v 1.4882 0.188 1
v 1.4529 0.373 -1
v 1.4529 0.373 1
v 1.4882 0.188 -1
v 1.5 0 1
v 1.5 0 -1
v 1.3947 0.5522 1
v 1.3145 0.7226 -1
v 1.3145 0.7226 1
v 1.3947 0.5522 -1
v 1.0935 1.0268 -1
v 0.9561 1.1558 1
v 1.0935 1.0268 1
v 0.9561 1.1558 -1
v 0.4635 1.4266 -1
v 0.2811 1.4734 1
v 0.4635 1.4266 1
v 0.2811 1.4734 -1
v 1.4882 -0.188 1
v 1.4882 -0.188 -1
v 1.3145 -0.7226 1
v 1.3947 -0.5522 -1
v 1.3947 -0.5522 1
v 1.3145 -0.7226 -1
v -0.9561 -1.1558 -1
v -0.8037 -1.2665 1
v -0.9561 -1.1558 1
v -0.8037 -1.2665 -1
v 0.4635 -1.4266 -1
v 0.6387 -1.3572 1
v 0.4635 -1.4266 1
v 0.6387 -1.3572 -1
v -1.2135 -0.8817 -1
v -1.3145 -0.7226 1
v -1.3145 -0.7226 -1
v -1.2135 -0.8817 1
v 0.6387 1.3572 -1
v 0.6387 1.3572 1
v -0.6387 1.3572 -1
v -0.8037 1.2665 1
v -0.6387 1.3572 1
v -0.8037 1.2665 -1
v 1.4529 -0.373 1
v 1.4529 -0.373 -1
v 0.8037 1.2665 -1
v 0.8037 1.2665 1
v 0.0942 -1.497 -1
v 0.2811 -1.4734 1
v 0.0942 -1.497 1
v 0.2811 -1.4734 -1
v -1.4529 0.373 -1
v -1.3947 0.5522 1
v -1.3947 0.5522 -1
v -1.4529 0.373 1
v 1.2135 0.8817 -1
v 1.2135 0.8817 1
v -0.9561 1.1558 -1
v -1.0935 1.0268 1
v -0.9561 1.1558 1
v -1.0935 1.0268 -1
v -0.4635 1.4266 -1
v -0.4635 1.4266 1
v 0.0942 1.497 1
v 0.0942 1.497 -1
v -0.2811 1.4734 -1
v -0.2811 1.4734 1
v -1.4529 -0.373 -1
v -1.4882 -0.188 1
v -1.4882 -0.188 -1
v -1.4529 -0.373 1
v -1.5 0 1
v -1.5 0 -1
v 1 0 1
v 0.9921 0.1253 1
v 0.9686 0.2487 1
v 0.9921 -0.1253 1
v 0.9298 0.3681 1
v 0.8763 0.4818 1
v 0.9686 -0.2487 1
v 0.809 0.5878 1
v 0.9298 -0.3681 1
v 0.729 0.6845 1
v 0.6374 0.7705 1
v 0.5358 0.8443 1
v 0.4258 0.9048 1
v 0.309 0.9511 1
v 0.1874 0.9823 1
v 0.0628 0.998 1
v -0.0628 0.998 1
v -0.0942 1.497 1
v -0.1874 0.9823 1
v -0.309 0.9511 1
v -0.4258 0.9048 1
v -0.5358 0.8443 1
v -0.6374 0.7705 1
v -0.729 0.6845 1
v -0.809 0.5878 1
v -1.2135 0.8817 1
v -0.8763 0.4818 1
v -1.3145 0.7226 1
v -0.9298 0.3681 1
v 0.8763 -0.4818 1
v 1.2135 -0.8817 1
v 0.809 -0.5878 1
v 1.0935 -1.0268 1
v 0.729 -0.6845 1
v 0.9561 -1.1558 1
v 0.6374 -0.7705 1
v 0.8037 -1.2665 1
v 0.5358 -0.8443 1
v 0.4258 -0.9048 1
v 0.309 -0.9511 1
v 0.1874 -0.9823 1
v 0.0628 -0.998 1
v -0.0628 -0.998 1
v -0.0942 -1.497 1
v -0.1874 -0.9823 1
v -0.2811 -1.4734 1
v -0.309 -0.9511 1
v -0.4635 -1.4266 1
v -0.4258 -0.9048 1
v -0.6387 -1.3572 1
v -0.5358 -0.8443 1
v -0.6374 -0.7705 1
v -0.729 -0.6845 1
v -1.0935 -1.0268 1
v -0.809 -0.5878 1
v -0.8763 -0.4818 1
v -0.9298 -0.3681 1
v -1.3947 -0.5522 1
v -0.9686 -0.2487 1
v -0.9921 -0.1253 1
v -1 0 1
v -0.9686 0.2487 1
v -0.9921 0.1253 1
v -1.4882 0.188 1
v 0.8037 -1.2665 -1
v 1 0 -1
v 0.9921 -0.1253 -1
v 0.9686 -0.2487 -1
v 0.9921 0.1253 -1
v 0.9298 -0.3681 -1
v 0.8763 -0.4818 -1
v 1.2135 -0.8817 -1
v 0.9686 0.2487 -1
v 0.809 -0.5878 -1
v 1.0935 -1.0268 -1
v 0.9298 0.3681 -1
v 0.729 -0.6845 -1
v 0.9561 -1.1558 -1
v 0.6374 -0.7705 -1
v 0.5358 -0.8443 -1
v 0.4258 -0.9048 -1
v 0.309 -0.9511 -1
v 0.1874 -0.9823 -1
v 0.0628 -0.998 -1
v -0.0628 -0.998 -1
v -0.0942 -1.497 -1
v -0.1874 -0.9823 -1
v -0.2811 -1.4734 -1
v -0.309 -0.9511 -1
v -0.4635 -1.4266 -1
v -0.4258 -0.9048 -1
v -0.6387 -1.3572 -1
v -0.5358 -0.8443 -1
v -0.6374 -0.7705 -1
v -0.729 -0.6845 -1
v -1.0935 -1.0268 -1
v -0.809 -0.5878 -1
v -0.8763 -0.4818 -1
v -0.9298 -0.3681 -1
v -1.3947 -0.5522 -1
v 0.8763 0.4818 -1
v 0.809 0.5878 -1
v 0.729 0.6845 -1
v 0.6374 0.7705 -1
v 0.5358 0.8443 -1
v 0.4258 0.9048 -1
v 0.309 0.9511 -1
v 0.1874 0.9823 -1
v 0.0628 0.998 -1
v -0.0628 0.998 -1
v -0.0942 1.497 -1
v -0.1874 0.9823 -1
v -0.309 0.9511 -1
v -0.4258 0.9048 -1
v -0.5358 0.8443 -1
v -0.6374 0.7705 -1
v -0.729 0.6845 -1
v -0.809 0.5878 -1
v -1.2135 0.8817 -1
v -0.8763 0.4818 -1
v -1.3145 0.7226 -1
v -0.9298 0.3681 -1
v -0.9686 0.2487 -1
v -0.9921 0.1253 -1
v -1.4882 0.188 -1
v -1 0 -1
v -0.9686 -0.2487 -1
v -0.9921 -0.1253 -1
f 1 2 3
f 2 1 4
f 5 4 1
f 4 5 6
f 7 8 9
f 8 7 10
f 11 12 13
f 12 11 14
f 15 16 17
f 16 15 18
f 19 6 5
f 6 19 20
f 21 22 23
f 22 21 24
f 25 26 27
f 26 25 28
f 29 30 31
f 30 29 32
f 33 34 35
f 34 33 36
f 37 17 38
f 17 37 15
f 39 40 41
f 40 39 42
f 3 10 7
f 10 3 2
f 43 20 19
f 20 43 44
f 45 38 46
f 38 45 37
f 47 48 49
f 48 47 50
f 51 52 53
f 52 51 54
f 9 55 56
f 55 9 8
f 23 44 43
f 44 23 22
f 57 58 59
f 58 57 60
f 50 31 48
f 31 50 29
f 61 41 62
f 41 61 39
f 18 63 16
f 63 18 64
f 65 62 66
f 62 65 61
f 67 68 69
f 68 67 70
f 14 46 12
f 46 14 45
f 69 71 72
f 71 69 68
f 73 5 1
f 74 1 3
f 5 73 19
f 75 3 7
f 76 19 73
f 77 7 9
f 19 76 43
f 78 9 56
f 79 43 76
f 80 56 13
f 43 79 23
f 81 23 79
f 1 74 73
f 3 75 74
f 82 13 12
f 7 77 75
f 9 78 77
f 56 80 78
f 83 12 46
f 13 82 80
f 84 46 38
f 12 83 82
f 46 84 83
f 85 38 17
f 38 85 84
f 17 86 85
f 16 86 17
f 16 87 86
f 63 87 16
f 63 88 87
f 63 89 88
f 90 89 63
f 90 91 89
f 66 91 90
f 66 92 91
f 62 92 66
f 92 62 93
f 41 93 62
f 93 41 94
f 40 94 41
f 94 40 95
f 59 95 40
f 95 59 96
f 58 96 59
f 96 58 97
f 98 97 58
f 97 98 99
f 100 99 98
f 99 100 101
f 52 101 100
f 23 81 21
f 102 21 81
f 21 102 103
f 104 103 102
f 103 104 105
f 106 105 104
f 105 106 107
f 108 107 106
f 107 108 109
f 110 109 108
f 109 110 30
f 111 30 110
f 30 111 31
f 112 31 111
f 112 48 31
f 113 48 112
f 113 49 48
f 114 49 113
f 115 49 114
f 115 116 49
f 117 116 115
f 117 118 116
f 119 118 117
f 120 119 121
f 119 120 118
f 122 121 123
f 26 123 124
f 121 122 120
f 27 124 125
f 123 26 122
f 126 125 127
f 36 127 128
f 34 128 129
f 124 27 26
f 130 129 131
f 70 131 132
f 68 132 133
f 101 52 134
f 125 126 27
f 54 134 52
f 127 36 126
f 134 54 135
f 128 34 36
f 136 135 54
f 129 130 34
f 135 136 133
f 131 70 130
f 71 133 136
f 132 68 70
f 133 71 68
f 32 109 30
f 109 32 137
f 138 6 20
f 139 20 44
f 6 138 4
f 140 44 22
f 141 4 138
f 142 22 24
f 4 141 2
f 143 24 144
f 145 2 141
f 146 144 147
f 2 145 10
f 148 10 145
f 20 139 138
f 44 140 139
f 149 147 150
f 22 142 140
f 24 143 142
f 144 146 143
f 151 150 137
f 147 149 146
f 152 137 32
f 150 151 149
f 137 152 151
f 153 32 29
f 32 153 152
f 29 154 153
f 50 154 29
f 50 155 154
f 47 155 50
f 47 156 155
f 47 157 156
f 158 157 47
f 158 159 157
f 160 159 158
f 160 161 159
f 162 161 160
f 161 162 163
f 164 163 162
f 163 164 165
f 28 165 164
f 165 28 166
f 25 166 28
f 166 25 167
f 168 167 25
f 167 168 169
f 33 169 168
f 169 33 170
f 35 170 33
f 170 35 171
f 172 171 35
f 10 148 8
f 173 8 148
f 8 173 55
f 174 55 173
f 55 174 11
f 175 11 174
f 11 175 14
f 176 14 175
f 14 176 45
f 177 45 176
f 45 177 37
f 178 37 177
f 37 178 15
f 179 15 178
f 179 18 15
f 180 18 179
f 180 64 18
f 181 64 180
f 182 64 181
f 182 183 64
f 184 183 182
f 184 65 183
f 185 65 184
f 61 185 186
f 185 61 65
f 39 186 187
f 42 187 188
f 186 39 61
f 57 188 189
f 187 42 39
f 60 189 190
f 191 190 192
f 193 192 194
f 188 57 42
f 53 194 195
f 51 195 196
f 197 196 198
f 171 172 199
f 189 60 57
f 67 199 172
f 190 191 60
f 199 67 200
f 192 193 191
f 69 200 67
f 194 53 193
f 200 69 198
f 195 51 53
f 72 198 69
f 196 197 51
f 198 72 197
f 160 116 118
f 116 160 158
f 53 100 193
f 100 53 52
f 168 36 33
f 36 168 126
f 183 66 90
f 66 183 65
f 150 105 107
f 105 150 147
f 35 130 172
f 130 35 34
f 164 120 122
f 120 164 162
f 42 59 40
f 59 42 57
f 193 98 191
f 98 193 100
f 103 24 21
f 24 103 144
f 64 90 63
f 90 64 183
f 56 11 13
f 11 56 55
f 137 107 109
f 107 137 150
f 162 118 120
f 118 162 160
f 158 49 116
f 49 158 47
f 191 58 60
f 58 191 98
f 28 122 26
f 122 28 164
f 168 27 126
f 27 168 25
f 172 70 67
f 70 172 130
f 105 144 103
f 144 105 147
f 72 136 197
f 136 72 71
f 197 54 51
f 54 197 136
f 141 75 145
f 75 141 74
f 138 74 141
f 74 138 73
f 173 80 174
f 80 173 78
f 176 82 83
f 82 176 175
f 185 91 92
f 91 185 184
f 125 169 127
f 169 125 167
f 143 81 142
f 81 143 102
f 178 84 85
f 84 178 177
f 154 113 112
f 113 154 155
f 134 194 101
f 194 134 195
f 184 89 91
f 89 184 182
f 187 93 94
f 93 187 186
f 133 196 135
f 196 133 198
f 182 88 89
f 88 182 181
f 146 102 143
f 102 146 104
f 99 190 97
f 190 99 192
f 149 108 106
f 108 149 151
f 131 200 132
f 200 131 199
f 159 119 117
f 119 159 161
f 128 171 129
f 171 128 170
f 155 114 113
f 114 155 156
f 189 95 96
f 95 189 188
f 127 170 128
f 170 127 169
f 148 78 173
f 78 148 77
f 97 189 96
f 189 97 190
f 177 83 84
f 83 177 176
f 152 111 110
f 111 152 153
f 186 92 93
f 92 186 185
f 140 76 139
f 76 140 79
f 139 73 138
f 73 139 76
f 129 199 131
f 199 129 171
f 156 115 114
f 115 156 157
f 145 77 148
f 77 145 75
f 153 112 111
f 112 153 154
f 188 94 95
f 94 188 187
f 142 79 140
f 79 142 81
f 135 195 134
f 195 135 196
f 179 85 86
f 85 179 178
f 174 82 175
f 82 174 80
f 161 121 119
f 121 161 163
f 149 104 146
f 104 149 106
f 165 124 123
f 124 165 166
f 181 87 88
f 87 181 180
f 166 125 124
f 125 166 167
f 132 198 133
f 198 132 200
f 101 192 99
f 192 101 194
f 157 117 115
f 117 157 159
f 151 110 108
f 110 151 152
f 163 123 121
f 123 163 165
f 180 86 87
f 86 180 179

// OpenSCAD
$fn = 50;


difference() {
	union() {
		translate(v = [0, 0, -1.0000000000]) {
			cylinder(h = 2, r = 1.5000000000);
		}
	}
	union() {
		translate(v = [0, 0, -100.0000000000]) {
			cylinder(h = 200, r = 1.0000000000);
		}
	}
}
